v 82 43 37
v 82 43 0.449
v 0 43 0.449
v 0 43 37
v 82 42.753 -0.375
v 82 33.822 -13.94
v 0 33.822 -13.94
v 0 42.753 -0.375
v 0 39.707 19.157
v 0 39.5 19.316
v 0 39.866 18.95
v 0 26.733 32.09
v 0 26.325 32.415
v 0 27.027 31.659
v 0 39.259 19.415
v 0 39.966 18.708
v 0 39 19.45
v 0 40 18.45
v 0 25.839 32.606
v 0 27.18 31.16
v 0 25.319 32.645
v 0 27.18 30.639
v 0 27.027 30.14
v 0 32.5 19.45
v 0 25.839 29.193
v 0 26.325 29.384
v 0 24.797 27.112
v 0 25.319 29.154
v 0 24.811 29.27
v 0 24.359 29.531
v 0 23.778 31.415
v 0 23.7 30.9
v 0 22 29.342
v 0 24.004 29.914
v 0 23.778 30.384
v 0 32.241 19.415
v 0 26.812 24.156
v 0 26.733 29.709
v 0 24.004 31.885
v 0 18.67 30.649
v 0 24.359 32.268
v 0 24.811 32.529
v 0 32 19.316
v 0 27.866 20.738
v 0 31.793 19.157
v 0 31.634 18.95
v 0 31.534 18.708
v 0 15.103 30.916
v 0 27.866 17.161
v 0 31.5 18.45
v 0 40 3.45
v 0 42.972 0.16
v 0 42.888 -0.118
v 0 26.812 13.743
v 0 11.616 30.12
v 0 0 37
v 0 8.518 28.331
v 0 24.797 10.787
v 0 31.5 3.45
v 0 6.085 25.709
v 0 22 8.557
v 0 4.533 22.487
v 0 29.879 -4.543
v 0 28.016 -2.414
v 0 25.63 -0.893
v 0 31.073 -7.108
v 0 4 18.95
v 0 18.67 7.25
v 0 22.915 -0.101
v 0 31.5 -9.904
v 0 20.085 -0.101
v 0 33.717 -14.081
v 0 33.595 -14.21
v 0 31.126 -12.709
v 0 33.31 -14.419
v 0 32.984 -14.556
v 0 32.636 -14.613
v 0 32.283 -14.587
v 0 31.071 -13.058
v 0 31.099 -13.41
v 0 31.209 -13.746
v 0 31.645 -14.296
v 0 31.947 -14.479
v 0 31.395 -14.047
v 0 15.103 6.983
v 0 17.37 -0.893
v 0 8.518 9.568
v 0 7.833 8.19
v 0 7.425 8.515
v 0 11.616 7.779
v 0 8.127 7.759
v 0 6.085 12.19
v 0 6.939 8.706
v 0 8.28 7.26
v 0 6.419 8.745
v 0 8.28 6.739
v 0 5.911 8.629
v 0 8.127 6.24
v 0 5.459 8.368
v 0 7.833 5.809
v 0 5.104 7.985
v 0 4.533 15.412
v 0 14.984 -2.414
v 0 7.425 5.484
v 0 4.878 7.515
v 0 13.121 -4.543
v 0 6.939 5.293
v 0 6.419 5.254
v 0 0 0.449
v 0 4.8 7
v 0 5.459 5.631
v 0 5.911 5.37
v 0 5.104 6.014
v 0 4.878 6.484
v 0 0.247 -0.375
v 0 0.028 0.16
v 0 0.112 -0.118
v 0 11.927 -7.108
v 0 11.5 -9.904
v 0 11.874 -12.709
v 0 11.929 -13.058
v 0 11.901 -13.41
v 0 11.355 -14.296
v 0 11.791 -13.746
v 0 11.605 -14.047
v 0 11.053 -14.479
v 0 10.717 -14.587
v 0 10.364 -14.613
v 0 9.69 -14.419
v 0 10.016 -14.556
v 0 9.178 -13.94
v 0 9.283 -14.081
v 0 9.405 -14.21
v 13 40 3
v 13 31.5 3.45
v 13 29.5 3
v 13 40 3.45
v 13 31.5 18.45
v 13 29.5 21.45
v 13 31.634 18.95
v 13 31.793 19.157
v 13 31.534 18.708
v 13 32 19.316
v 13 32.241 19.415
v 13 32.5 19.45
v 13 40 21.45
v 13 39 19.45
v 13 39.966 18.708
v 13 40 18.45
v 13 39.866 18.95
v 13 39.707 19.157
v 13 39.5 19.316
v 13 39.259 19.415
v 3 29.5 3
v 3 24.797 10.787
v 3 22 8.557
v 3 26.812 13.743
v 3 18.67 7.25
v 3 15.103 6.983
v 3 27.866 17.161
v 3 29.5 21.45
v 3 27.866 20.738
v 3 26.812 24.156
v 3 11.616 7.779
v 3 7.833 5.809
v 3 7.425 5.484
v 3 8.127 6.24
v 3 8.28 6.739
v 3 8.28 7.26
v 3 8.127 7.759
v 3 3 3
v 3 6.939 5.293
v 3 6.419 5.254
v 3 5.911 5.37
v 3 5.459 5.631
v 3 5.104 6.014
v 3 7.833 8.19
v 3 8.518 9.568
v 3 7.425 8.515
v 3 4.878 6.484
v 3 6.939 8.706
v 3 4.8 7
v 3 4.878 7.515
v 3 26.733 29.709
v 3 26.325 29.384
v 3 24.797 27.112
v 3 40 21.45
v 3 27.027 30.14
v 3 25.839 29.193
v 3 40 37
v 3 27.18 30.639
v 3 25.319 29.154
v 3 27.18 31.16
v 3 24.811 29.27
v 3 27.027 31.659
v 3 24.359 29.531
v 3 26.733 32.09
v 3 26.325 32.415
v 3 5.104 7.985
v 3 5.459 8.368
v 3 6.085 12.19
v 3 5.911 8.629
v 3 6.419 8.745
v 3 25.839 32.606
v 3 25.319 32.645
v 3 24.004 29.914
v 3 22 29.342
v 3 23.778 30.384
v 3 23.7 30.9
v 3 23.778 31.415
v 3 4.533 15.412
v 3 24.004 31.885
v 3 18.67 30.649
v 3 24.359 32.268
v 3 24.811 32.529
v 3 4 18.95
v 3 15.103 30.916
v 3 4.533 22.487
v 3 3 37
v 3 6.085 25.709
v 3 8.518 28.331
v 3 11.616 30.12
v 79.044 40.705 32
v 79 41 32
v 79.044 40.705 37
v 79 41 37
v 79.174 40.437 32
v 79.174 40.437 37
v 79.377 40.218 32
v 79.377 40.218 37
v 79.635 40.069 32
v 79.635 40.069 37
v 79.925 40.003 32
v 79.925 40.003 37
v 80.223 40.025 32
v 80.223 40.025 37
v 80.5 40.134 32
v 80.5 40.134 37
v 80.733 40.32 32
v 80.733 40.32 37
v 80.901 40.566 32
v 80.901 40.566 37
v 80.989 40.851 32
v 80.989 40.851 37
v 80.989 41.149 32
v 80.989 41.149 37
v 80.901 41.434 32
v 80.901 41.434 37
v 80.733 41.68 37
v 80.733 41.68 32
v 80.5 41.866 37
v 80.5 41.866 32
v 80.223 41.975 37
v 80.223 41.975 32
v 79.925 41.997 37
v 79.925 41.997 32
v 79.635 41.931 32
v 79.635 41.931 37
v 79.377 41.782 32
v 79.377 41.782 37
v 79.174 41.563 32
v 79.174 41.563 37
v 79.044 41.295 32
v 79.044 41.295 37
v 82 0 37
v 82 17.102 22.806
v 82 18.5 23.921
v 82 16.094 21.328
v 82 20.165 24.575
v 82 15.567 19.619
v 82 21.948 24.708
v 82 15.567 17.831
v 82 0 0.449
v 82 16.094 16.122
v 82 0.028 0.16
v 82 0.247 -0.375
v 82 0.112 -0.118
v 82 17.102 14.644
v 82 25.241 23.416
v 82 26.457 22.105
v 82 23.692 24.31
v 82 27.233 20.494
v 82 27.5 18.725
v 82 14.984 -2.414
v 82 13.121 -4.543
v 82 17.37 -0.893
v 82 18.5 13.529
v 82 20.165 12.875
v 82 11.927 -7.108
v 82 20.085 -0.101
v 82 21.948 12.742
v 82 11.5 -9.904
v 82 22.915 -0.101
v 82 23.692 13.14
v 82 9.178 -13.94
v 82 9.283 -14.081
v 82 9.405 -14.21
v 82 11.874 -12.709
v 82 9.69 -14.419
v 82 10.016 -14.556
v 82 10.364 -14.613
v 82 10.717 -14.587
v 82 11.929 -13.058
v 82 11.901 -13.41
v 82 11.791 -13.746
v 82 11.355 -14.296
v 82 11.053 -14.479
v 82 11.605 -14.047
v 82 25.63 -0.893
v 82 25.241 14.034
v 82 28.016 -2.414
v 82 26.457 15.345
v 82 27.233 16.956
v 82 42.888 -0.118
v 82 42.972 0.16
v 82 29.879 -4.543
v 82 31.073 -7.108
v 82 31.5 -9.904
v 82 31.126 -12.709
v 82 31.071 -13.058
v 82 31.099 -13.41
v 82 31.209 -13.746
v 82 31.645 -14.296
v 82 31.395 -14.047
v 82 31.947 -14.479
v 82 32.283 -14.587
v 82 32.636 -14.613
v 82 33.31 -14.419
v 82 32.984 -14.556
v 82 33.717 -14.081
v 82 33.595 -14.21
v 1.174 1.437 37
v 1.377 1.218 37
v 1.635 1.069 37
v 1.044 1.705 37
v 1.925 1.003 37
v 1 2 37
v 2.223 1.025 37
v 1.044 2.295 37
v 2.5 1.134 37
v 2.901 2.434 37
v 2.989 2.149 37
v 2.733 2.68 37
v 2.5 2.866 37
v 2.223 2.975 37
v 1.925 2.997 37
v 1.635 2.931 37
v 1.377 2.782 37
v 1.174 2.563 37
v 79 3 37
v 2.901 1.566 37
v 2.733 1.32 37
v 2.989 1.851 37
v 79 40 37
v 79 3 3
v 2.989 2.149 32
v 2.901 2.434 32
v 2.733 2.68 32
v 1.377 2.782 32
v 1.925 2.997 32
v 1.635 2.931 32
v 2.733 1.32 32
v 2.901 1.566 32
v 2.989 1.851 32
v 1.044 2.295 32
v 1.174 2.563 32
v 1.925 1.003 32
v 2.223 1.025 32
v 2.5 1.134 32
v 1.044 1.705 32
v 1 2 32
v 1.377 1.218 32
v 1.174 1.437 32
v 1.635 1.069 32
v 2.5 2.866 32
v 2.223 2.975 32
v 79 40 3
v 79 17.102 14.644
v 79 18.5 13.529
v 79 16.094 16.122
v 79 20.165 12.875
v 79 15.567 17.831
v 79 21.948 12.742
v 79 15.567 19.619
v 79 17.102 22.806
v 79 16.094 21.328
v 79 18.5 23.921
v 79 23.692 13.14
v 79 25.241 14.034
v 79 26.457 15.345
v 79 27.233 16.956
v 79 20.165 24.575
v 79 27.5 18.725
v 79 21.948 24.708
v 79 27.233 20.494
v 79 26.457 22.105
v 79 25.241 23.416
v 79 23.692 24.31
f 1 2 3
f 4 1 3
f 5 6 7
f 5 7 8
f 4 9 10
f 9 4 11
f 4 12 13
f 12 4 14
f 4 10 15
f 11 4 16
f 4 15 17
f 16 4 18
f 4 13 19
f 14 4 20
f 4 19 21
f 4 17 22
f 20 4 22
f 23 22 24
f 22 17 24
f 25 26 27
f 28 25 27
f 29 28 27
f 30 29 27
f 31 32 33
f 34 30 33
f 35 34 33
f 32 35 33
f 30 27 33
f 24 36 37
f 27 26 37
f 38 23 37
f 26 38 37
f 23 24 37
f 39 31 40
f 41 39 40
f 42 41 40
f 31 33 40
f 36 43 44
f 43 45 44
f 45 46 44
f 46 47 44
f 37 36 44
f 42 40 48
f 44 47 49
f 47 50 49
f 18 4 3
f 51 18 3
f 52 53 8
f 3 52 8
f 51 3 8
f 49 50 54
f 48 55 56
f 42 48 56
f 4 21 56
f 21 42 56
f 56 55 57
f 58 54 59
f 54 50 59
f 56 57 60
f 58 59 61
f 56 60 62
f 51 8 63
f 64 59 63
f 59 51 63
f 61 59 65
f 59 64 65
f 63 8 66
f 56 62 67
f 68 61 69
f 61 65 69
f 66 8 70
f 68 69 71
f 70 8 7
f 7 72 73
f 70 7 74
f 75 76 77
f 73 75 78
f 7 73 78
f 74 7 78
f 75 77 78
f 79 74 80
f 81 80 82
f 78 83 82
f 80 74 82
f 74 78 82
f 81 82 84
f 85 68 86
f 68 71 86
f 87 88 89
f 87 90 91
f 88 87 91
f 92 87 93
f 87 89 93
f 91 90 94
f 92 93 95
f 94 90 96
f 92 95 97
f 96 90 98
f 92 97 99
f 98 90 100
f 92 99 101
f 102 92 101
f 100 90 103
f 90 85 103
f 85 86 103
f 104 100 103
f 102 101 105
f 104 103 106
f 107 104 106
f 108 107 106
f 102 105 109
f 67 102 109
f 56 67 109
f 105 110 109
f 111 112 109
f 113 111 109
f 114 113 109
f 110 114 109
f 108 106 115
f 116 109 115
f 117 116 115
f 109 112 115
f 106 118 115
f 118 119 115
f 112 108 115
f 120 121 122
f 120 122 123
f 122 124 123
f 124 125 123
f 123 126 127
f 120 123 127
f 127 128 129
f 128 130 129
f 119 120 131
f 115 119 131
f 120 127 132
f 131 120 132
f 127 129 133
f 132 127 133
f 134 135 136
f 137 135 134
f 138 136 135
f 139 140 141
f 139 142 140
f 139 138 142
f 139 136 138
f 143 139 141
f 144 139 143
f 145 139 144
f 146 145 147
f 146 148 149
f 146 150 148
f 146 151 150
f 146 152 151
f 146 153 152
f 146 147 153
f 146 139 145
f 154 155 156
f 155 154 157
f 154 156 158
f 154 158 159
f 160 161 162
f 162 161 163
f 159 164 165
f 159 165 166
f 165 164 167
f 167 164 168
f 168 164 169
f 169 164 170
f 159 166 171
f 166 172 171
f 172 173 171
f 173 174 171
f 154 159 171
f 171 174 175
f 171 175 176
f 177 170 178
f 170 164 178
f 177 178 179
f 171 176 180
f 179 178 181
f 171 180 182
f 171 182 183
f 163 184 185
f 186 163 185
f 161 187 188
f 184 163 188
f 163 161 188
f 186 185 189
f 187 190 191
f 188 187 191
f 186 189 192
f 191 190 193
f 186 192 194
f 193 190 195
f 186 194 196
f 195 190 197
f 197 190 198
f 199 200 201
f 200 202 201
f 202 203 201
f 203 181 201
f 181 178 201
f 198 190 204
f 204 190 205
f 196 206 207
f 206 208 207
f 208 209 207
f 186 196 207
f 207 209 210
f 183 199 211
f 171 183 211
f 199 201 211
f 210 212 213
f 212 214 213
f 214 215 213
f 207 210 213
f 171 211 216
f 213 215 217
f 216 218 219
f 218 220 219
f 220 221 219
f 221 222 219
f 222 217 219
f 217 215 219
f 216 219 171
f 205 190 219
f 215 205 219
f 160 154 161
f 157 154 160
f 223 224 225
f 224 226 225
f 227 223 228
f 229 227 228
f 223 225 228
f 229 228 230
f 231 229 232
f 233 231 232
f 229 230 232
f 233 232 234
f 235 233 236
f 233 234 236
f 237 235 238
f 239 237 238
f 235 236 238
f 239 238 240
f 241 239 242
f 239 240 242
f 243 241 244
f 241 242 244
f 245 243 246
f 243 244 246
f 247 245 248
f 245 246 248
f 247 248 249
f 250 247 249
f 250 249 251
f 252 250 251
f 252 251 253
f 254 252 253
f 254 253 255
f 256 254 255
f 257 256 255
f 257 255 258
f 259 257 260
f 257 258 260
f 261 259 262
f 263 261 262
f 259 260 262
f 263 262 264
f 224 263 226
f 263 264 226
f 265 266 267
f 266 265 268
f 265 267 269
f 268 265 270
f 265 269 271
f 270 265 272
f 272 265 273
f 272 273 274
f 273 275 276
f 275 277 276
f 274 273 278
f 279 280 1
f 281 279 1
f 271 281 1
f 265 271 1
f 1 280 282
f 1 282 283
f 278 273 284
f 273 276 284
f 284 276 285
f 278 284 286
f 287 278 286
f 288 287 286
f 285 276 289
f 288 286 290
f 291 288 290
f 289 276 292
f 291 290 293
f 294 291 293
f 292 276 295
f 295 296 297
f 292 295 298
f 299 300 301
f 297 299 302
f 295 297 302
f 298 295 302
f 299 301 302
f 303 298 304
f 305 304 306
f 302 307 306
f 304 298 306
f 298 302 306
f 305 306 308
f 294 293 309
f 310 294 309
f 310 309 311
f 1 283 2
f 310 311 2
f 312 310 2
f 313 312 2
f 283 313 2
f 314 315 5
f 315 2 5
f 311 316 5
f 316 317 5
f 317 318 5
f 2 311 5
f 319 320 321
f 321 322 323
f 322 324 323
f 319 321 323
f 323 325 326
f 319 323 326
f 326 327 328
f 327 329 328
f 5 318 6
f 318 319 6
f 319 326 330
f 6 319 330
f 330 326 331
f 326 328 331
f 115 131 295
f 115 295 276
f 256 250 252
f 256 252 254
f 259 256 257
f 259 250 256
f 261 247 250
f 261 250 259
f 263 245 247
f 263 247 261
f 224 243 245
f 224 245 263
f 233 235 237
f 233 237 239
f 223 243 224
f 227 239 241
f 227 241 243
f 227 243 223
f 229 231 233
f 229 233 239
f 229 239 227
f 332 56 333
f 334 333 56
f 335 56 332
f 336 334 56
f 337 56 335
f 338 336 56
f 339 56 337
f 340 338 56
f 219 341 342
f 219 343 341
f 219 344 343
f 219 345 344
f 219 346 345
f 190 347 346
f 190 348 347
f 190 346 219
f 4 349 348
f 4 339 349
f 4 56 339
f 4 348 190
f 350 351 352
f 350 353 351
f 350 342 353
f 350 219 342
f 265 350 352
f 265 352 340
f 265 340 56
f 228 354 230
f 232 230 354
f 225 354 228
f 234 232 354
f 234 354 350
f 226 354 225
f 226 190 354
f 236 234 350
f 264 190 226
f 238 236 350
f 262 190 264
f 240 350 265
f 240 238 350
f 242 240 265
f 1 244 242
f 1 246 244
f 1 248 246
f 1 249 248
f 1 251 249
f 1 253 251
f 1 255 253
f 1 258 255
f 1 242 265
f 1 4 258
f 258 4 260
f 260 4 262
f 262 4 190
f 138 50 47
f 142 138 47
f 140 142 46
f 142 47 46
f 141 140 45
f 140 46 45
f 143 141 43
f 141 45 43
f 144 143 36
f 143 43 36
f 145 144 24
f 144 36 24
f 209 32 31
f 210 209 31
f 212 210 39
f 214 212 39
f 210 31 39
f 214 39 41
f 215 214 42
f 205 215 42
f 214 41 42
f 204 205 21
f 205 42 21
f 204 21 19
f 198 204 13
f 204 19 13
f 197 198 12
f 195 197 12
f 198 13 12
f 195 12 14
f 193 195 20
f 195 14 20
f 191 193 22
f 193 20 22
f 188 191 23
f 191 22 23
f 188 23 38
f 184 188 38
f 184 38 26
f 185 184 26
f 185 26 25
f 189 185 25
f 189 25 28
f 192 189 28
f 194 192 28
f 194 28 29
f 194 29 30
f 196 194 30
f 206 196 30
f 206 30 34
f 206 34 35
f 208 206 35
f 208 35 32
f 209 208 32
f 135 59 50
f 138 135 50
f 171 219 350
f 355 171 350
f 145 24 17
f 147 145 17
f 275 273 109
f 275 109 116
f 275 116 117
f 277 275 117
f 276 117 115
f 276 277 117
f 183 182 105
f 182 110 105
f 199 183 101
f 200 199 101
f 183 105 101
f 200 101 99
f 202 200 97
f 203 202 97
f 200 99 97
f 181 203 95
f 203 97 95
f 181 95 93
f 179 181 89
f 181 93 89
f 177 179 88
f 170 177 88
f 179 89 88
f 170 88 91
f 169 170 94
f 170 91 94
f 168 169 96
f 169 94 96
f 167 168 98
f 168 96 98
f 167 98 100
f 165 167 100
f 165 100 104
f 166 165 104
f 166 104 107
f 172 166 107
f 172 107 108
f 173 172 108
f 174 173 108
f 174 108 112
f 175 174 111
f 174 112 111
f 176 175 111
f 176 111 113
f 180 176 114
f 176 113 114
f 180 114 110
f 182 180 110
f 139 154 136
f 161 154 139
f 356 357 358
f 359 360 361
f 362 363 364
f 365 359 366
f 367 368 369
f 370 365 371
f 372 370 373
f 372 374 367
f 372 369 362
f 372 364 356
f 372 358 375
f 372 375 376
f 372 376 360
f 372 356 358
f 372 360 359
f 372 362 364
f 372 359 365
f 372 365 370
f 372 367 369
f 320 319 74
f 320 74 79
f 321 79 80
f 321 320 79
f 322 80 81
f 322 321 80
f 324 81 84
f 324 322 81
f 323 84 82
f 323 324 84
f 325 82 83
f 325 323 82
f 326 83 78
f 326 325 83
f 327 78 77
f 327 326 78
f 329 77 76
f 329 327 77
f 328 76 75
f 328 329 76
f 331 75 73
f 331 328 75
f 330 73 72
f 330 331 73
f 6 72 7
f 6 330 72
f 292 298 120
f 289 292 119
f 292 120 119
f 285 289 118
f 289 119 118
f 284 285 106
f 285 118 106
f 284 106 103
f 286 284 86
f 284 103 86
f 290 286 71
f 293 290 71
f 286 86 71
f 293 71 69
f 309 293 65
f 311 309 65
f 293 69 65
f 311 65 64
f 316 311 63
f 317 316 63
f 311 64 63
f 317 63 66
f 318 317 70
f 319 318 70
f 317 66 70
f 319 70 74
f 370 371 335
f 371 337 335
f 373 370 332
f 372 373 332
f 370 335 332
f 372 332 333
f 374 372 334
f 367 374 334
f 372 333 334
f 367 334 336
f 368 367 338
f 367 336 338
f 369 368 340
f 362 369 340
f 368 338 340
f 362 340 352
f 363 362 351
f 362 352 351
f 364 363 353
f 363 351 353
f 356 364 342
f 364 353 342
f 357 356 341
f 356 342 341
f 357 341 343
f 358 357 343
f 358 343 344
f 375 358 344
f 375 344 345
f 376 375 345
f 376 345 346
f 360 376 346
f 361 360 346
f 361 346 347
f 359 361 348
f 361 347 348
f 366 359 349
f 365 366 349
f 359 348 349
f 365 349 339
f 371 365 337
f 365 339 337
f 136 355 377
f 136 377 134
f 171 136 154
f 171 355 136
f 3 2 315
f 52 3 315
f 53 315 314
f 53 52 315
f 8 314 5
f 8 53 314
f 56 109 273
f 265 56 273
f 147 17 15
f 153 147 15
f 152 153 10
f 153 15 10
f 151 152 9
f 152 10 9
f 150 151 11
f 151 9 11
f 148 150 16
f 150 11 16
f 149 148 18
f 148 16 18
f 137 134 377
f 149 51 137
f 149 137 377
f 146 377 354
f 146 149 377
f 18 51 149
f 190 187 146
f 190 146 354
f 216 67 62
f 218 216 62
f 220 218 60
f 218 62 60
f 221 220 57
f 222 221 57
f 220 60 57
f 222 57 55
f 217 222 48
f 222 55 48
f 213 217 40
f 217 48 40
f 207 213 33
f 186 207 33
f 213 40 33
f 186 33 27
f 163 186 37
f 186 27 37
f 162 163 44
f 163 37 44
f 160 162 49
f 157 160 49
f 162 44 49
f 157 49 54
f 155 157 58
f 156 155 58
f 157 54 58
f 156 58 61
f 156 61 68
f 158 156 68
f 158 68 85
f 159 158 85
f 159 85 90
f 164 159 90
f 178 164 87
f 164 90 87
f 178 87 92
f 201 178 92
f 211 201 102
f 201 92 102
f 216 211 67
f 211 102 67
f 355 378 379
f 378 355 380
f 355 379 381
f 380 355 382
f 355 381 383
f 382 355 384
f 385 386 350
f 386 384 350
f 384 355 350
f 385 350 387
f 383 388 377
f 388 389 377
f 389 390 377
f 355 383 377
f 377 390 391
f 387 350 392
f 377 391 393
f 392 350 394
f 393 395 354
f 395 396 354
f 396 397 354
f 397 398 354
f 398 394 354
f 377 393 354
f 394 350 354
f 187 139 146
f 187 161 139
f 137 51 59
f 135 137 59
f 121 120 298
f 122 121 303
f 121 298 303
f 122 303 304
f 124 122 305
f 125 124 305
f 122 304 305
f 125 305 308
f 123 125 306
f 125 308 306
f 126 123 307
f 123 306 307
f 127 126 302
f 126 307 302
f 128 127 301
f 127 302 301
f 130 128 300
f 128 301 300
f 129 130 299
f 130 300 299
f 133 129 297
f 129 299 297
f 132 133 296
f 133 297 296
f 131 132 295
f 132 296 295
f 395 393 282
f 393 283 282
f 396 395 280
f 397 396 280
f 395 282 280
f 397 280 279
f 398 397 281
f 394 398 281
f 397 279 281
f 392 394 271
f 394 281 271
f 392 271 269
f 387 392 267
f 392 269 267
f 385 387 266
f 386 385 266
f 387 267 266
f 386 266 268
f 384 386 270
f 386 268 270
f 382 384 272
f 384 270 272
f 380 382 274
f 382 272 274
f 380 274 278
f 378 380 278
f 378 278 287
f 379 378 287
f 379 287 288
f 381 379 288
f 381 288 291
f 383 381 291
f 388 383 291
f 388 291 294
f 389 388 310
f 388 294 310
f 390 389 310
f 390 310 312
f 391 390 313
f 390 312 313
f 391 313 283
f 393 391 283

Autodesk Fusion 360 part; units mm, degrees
sketch "Sketch1" plane through (0, 0, 0) normal (0, 0, 1) x (1, 0, 0)
  line L0 (0, 0) -> (82, 0)
  line L1 (82, 0) -> (82, 43)
  line L2 (82, 43) -> (0, 43)
  line L3 (0, 43) -> (0, 0)
  dimension "d1" = 82
  dimension "d2" = 43
extrude "Extrude1" add sketch "Sketch1" along normal blind 37
sketch "Sketch2" plane through (0, 0, 37) normal (0, 0, 1) x (-1, 0, 0)
  line L0 (0, -43) -> (0, 0)
  line L1 (0, 0) -> (-82, 0)
  line L2 (-82, 0) -> (-82, -43)
  line L3 (-82, -43) -> (0, -43)
  line L4 (-3, -3) -> (-79, -3)
  line L5 (-79, -3) -> (-79, -40)
  line L6 (-79, -40) -> (-3, -40)
  line L7 (-3, -40) -> (-3, -3)
  dimension "d5" = 3
  dimension "d6" = 3
  dimension "d7" = 3
  dimension "d8" = 3
extrude "Extrude2" cut sketch "Sketch2" against normal blind 34 contours L4 L5 L6 L7
sketch "Sketch3" plane through (0, 0, 0) normal (-1, 0, 0) x (0, -1, 0)
  line L0 (-43, 0) -> (0, 0)
  line L1 (0, 0) -> (0, 37)
  line L2 (0, 37) -> (-43, 37)
  line L3 (-43, 37) -> (-43, 0)
  circle A0 centre (-21.5, -10) radius 10
  circle A1 centre (-21.5, -10) radius 12.5
  line L4 (-46.7088, -16) -> (3.2912, -16)
  line L5 (-32.4659, -16) -> (-43, 0)
  line L6 (-10.5341, -16) -> (0, 0)
  dimension "d11" = 20
  dimension "d12" = 25
  dimension "d13" = 10
  dimension "d14" = 21.5
  dimension "d16" = 16
extrude "Extrude3" add sketch "Sketch3" against normal blind 82 contours L0 A1 L5 | L0 A0 A1 L4 | L0 A0 A1 L4 | L0 A1 L6
fillet "Fillet1" radius 1.5 6 edges at (41, 13.5, -16) (41, 29.5, -16) (41, 32.4659, -16) (41, 10.5341, -16) (41, 43, 0) (41, 0, 0)
sketch "Sketch4" plane through (0, 0, 0) normal (-1, 0, 0) x (0, -1, 0)
  arc A0 (-0.2472, -0.3754) -> (0, 0.4495) centre (-1.5, 0.4495) ccw
  line L0 (0, 0.4495) -> (0, 37)
  line L1 (0, 37) -> (-43, 37)
  line L2 (-43, 37) -> (-43, 0.4495)
  arc A1 (-43, 0.4495) -> (-42.7528, -0.3754) centre (-41.5, 0.4495) ccw
  line L3 (-42.7528, -0.3754) -> (-33.8235, -13.938)
  arc A2 (-33.8235, -13.938) -> (-31.1266, -12.7071) centre (-32.5706, -13.1131) ccw
  arc A3 (-11.8734, -12.7071) -> (-31.1266, -12.7071) centre (-21.5, -10) ccw
  arc A4 (-11.8734, -12.7071) -> (-9.1765, -13.938) centre (-10.4294, -13.1131) ccw
  line L4 (-9.1765, -13.938) -> (-0.2472, -0.3754)
  line L5 (-29, 34.4495) -> (-3, 34.4495)
  line L6 (-3, 34.4495) -> (-3, 3.4495)
  line L7 (-3, 3.4495) -> (-29, 3.4495)
  line L8 (-29, 3.4495) -> (-29, 34.4495)
  circle A5 centre (-16, 18.9495) radius 12
  circle A6 centre (-25.45, 30.8995) radius 1.75
  circle A7 centre (-6.55, 6.9995) radius 1.75
  line L9 (0, 0.4495) -> (-43, 0.4495)
  line L10 (-31.5, 3.4495) -> (-40, 3.4495)
  line L11 (-40, 3.4495) -> (-40, 19.4495)
  line L12 (-40, 19.4495) -> (-31.5, 19.4495)
  line L13 (-31.5, 19.4495) -> (-31.5, 3.4495)
  dimension "d21" = 24
  dimension "d22" = 31
  dimension "d23" = 26
  dimension "d24" = 13
  dimension "d25" = 15.5
  dimension "d26" = 3.5
  dimension "d27" = 3.5
  dimension "d28" = 3.55
  dimension "d29" = 3.55
  dimension "d30" = 3.55
  dimension "d31" = 3.55
  dimension "d32" = 3
  dimension "d33" = 3
  dimension "d34" = 16
  dimension "d35" = 8.5
  dimension "d36" = 3
  dimension "d37" = 3
extrude "Extrude4" cut sketch "Sketch4" against normal blind 3 contours A5 | A6 | A7 | L10 L11 L12 L13
sketch "Sketch5" plane through (3, 0, 0) normal (1, 0, 0) x (0, 1, 0)
  line L0 (40, 3.4495) -> (31.5, 3.4495)
  line L1 (31.5, 3.4495) -> (31.5, 19.4495)
  line L2 (31.5, 19.4495) -> (40, 19.4495)
  line L3 (40, 19.4495) -> (40, 37)
  line L4 (40, 37) -> (3, 37)
  line L5 (3, 37) -> (3, 3)
  line L6 (3, 3) -> (40, 3)
  line L7 (40, 3) -> (40, 3.4495)
  circle A0 centre (16, 18.9495) radius 12
  circle A1 centre (6.55, 6.9995) radius 1.75
  circle A2 centre (25.45, 30.8995) radius 1.75
  line L8 (40, 3) -> (29.5, 3)
  line L9 (29.5, 3) -> (29.5, 21.4495)
  line L10 (29.5, 21.4495) -> (40, 21.4495)
  line L11 (40, 21.4495) -> (40, 3)
  dimension "d40" = 2
  dimension "d41" = 2
extrude "Extrude5" add sketch "Sketch5" along normal blind 10 contours L0 L1 L2 L3 L6 L7 L8 L9 L10 L11
fillet "Fillet2" radius 1 2 edges at (6.5, 31.5, 19.4495) (6.5, 40, 19.4495)
sketch "Sketch6" plane through (82, 0, 0) normal (1, 0, 0) x (0, 1, 0)
  arc A0 (0, 0.4495) -> (0.2472, -0.3754) centre (1.5, 0.4495) ccw
  line L0 (0.2472, -0.3754) -> (9.1765, -13.938)
  arc A1 (9.1765, -13.938) -> (11.8734, -12.7071) centre (10.4294, -13.1131) ccw
  arc A2 (31.1266, -12.7071) -> (11.8734, -12.7071) centre (21.5, -10) ccw
  arc A3 (31.1266, -12.7071) -> (33.8235, -13.938) centre (32.5706, -13.1131) ccw
  line L1 (33.8235, -13.938) -> (42.7528, -0.3754)
  arc A4 (42.7528, -0.3754) -> (43, 0.4495) centre (41.5, 0.4495) ccw
  line L2 (43, 0.4495) -> (43, 37)
  line L3 (43, 37) -> (0, 37)
  line L4 (0, 37) -> (0, 0.4495)
  circle A5 centre (21.5, 18.725) radius 6
  dimension "d46" = 21.5
  dimension "d47" = 36.5505
  dimension "d48" = 18.275
  dimension "d49" = 12
extrude "Extrude6" cut sketch "Sketch6" against normal blind 3 contours A5
sketch "Sketch7" plane through (0, 0, 37) normal (0, 0, 1) x (-1, 0, 0)
  line L0 (-79, -3) -> (-3, -3)
  line L1 (-3, -3) -> (-3, -40)
  line L2 (-3, -40) -> (-79, -40)
  line L3 (-79, -40) -> (-79, -3)
  line L4 (0, -43) -> (0, 0)
  line L5 (0, 0) -> (-82, 0)
  line L6 (-82, 0) -> (-82, -43)
  line L7 (-82, -43) -> (0, -43)
  circle A0 centre (-2, -2) radius 1
  circle A1 centre (-80, -41) radius 1
  dimension "d52" = 2
  dimension "d53" = 2
  dimension "d54" = 2
  dimension "d55" = 2
  dimension "d56" = 2
  dimension "d57" = 2
extrude "Extrude7" cut sketch "Sketch7" against normal blind 5 contours A0 | A1
equation "d14 = ( 43 / 2 ) * 1 mm"
equation "d24 = ( 26 / 2 ) * 1 mm"
equation "d25 = ( 31 / 2 ) * 1 mm"
equation "d46 = ( 43 / 2 ) * 1 mm"
equation "d48 = ( 36.55 / 2 ) * 1 mm"
